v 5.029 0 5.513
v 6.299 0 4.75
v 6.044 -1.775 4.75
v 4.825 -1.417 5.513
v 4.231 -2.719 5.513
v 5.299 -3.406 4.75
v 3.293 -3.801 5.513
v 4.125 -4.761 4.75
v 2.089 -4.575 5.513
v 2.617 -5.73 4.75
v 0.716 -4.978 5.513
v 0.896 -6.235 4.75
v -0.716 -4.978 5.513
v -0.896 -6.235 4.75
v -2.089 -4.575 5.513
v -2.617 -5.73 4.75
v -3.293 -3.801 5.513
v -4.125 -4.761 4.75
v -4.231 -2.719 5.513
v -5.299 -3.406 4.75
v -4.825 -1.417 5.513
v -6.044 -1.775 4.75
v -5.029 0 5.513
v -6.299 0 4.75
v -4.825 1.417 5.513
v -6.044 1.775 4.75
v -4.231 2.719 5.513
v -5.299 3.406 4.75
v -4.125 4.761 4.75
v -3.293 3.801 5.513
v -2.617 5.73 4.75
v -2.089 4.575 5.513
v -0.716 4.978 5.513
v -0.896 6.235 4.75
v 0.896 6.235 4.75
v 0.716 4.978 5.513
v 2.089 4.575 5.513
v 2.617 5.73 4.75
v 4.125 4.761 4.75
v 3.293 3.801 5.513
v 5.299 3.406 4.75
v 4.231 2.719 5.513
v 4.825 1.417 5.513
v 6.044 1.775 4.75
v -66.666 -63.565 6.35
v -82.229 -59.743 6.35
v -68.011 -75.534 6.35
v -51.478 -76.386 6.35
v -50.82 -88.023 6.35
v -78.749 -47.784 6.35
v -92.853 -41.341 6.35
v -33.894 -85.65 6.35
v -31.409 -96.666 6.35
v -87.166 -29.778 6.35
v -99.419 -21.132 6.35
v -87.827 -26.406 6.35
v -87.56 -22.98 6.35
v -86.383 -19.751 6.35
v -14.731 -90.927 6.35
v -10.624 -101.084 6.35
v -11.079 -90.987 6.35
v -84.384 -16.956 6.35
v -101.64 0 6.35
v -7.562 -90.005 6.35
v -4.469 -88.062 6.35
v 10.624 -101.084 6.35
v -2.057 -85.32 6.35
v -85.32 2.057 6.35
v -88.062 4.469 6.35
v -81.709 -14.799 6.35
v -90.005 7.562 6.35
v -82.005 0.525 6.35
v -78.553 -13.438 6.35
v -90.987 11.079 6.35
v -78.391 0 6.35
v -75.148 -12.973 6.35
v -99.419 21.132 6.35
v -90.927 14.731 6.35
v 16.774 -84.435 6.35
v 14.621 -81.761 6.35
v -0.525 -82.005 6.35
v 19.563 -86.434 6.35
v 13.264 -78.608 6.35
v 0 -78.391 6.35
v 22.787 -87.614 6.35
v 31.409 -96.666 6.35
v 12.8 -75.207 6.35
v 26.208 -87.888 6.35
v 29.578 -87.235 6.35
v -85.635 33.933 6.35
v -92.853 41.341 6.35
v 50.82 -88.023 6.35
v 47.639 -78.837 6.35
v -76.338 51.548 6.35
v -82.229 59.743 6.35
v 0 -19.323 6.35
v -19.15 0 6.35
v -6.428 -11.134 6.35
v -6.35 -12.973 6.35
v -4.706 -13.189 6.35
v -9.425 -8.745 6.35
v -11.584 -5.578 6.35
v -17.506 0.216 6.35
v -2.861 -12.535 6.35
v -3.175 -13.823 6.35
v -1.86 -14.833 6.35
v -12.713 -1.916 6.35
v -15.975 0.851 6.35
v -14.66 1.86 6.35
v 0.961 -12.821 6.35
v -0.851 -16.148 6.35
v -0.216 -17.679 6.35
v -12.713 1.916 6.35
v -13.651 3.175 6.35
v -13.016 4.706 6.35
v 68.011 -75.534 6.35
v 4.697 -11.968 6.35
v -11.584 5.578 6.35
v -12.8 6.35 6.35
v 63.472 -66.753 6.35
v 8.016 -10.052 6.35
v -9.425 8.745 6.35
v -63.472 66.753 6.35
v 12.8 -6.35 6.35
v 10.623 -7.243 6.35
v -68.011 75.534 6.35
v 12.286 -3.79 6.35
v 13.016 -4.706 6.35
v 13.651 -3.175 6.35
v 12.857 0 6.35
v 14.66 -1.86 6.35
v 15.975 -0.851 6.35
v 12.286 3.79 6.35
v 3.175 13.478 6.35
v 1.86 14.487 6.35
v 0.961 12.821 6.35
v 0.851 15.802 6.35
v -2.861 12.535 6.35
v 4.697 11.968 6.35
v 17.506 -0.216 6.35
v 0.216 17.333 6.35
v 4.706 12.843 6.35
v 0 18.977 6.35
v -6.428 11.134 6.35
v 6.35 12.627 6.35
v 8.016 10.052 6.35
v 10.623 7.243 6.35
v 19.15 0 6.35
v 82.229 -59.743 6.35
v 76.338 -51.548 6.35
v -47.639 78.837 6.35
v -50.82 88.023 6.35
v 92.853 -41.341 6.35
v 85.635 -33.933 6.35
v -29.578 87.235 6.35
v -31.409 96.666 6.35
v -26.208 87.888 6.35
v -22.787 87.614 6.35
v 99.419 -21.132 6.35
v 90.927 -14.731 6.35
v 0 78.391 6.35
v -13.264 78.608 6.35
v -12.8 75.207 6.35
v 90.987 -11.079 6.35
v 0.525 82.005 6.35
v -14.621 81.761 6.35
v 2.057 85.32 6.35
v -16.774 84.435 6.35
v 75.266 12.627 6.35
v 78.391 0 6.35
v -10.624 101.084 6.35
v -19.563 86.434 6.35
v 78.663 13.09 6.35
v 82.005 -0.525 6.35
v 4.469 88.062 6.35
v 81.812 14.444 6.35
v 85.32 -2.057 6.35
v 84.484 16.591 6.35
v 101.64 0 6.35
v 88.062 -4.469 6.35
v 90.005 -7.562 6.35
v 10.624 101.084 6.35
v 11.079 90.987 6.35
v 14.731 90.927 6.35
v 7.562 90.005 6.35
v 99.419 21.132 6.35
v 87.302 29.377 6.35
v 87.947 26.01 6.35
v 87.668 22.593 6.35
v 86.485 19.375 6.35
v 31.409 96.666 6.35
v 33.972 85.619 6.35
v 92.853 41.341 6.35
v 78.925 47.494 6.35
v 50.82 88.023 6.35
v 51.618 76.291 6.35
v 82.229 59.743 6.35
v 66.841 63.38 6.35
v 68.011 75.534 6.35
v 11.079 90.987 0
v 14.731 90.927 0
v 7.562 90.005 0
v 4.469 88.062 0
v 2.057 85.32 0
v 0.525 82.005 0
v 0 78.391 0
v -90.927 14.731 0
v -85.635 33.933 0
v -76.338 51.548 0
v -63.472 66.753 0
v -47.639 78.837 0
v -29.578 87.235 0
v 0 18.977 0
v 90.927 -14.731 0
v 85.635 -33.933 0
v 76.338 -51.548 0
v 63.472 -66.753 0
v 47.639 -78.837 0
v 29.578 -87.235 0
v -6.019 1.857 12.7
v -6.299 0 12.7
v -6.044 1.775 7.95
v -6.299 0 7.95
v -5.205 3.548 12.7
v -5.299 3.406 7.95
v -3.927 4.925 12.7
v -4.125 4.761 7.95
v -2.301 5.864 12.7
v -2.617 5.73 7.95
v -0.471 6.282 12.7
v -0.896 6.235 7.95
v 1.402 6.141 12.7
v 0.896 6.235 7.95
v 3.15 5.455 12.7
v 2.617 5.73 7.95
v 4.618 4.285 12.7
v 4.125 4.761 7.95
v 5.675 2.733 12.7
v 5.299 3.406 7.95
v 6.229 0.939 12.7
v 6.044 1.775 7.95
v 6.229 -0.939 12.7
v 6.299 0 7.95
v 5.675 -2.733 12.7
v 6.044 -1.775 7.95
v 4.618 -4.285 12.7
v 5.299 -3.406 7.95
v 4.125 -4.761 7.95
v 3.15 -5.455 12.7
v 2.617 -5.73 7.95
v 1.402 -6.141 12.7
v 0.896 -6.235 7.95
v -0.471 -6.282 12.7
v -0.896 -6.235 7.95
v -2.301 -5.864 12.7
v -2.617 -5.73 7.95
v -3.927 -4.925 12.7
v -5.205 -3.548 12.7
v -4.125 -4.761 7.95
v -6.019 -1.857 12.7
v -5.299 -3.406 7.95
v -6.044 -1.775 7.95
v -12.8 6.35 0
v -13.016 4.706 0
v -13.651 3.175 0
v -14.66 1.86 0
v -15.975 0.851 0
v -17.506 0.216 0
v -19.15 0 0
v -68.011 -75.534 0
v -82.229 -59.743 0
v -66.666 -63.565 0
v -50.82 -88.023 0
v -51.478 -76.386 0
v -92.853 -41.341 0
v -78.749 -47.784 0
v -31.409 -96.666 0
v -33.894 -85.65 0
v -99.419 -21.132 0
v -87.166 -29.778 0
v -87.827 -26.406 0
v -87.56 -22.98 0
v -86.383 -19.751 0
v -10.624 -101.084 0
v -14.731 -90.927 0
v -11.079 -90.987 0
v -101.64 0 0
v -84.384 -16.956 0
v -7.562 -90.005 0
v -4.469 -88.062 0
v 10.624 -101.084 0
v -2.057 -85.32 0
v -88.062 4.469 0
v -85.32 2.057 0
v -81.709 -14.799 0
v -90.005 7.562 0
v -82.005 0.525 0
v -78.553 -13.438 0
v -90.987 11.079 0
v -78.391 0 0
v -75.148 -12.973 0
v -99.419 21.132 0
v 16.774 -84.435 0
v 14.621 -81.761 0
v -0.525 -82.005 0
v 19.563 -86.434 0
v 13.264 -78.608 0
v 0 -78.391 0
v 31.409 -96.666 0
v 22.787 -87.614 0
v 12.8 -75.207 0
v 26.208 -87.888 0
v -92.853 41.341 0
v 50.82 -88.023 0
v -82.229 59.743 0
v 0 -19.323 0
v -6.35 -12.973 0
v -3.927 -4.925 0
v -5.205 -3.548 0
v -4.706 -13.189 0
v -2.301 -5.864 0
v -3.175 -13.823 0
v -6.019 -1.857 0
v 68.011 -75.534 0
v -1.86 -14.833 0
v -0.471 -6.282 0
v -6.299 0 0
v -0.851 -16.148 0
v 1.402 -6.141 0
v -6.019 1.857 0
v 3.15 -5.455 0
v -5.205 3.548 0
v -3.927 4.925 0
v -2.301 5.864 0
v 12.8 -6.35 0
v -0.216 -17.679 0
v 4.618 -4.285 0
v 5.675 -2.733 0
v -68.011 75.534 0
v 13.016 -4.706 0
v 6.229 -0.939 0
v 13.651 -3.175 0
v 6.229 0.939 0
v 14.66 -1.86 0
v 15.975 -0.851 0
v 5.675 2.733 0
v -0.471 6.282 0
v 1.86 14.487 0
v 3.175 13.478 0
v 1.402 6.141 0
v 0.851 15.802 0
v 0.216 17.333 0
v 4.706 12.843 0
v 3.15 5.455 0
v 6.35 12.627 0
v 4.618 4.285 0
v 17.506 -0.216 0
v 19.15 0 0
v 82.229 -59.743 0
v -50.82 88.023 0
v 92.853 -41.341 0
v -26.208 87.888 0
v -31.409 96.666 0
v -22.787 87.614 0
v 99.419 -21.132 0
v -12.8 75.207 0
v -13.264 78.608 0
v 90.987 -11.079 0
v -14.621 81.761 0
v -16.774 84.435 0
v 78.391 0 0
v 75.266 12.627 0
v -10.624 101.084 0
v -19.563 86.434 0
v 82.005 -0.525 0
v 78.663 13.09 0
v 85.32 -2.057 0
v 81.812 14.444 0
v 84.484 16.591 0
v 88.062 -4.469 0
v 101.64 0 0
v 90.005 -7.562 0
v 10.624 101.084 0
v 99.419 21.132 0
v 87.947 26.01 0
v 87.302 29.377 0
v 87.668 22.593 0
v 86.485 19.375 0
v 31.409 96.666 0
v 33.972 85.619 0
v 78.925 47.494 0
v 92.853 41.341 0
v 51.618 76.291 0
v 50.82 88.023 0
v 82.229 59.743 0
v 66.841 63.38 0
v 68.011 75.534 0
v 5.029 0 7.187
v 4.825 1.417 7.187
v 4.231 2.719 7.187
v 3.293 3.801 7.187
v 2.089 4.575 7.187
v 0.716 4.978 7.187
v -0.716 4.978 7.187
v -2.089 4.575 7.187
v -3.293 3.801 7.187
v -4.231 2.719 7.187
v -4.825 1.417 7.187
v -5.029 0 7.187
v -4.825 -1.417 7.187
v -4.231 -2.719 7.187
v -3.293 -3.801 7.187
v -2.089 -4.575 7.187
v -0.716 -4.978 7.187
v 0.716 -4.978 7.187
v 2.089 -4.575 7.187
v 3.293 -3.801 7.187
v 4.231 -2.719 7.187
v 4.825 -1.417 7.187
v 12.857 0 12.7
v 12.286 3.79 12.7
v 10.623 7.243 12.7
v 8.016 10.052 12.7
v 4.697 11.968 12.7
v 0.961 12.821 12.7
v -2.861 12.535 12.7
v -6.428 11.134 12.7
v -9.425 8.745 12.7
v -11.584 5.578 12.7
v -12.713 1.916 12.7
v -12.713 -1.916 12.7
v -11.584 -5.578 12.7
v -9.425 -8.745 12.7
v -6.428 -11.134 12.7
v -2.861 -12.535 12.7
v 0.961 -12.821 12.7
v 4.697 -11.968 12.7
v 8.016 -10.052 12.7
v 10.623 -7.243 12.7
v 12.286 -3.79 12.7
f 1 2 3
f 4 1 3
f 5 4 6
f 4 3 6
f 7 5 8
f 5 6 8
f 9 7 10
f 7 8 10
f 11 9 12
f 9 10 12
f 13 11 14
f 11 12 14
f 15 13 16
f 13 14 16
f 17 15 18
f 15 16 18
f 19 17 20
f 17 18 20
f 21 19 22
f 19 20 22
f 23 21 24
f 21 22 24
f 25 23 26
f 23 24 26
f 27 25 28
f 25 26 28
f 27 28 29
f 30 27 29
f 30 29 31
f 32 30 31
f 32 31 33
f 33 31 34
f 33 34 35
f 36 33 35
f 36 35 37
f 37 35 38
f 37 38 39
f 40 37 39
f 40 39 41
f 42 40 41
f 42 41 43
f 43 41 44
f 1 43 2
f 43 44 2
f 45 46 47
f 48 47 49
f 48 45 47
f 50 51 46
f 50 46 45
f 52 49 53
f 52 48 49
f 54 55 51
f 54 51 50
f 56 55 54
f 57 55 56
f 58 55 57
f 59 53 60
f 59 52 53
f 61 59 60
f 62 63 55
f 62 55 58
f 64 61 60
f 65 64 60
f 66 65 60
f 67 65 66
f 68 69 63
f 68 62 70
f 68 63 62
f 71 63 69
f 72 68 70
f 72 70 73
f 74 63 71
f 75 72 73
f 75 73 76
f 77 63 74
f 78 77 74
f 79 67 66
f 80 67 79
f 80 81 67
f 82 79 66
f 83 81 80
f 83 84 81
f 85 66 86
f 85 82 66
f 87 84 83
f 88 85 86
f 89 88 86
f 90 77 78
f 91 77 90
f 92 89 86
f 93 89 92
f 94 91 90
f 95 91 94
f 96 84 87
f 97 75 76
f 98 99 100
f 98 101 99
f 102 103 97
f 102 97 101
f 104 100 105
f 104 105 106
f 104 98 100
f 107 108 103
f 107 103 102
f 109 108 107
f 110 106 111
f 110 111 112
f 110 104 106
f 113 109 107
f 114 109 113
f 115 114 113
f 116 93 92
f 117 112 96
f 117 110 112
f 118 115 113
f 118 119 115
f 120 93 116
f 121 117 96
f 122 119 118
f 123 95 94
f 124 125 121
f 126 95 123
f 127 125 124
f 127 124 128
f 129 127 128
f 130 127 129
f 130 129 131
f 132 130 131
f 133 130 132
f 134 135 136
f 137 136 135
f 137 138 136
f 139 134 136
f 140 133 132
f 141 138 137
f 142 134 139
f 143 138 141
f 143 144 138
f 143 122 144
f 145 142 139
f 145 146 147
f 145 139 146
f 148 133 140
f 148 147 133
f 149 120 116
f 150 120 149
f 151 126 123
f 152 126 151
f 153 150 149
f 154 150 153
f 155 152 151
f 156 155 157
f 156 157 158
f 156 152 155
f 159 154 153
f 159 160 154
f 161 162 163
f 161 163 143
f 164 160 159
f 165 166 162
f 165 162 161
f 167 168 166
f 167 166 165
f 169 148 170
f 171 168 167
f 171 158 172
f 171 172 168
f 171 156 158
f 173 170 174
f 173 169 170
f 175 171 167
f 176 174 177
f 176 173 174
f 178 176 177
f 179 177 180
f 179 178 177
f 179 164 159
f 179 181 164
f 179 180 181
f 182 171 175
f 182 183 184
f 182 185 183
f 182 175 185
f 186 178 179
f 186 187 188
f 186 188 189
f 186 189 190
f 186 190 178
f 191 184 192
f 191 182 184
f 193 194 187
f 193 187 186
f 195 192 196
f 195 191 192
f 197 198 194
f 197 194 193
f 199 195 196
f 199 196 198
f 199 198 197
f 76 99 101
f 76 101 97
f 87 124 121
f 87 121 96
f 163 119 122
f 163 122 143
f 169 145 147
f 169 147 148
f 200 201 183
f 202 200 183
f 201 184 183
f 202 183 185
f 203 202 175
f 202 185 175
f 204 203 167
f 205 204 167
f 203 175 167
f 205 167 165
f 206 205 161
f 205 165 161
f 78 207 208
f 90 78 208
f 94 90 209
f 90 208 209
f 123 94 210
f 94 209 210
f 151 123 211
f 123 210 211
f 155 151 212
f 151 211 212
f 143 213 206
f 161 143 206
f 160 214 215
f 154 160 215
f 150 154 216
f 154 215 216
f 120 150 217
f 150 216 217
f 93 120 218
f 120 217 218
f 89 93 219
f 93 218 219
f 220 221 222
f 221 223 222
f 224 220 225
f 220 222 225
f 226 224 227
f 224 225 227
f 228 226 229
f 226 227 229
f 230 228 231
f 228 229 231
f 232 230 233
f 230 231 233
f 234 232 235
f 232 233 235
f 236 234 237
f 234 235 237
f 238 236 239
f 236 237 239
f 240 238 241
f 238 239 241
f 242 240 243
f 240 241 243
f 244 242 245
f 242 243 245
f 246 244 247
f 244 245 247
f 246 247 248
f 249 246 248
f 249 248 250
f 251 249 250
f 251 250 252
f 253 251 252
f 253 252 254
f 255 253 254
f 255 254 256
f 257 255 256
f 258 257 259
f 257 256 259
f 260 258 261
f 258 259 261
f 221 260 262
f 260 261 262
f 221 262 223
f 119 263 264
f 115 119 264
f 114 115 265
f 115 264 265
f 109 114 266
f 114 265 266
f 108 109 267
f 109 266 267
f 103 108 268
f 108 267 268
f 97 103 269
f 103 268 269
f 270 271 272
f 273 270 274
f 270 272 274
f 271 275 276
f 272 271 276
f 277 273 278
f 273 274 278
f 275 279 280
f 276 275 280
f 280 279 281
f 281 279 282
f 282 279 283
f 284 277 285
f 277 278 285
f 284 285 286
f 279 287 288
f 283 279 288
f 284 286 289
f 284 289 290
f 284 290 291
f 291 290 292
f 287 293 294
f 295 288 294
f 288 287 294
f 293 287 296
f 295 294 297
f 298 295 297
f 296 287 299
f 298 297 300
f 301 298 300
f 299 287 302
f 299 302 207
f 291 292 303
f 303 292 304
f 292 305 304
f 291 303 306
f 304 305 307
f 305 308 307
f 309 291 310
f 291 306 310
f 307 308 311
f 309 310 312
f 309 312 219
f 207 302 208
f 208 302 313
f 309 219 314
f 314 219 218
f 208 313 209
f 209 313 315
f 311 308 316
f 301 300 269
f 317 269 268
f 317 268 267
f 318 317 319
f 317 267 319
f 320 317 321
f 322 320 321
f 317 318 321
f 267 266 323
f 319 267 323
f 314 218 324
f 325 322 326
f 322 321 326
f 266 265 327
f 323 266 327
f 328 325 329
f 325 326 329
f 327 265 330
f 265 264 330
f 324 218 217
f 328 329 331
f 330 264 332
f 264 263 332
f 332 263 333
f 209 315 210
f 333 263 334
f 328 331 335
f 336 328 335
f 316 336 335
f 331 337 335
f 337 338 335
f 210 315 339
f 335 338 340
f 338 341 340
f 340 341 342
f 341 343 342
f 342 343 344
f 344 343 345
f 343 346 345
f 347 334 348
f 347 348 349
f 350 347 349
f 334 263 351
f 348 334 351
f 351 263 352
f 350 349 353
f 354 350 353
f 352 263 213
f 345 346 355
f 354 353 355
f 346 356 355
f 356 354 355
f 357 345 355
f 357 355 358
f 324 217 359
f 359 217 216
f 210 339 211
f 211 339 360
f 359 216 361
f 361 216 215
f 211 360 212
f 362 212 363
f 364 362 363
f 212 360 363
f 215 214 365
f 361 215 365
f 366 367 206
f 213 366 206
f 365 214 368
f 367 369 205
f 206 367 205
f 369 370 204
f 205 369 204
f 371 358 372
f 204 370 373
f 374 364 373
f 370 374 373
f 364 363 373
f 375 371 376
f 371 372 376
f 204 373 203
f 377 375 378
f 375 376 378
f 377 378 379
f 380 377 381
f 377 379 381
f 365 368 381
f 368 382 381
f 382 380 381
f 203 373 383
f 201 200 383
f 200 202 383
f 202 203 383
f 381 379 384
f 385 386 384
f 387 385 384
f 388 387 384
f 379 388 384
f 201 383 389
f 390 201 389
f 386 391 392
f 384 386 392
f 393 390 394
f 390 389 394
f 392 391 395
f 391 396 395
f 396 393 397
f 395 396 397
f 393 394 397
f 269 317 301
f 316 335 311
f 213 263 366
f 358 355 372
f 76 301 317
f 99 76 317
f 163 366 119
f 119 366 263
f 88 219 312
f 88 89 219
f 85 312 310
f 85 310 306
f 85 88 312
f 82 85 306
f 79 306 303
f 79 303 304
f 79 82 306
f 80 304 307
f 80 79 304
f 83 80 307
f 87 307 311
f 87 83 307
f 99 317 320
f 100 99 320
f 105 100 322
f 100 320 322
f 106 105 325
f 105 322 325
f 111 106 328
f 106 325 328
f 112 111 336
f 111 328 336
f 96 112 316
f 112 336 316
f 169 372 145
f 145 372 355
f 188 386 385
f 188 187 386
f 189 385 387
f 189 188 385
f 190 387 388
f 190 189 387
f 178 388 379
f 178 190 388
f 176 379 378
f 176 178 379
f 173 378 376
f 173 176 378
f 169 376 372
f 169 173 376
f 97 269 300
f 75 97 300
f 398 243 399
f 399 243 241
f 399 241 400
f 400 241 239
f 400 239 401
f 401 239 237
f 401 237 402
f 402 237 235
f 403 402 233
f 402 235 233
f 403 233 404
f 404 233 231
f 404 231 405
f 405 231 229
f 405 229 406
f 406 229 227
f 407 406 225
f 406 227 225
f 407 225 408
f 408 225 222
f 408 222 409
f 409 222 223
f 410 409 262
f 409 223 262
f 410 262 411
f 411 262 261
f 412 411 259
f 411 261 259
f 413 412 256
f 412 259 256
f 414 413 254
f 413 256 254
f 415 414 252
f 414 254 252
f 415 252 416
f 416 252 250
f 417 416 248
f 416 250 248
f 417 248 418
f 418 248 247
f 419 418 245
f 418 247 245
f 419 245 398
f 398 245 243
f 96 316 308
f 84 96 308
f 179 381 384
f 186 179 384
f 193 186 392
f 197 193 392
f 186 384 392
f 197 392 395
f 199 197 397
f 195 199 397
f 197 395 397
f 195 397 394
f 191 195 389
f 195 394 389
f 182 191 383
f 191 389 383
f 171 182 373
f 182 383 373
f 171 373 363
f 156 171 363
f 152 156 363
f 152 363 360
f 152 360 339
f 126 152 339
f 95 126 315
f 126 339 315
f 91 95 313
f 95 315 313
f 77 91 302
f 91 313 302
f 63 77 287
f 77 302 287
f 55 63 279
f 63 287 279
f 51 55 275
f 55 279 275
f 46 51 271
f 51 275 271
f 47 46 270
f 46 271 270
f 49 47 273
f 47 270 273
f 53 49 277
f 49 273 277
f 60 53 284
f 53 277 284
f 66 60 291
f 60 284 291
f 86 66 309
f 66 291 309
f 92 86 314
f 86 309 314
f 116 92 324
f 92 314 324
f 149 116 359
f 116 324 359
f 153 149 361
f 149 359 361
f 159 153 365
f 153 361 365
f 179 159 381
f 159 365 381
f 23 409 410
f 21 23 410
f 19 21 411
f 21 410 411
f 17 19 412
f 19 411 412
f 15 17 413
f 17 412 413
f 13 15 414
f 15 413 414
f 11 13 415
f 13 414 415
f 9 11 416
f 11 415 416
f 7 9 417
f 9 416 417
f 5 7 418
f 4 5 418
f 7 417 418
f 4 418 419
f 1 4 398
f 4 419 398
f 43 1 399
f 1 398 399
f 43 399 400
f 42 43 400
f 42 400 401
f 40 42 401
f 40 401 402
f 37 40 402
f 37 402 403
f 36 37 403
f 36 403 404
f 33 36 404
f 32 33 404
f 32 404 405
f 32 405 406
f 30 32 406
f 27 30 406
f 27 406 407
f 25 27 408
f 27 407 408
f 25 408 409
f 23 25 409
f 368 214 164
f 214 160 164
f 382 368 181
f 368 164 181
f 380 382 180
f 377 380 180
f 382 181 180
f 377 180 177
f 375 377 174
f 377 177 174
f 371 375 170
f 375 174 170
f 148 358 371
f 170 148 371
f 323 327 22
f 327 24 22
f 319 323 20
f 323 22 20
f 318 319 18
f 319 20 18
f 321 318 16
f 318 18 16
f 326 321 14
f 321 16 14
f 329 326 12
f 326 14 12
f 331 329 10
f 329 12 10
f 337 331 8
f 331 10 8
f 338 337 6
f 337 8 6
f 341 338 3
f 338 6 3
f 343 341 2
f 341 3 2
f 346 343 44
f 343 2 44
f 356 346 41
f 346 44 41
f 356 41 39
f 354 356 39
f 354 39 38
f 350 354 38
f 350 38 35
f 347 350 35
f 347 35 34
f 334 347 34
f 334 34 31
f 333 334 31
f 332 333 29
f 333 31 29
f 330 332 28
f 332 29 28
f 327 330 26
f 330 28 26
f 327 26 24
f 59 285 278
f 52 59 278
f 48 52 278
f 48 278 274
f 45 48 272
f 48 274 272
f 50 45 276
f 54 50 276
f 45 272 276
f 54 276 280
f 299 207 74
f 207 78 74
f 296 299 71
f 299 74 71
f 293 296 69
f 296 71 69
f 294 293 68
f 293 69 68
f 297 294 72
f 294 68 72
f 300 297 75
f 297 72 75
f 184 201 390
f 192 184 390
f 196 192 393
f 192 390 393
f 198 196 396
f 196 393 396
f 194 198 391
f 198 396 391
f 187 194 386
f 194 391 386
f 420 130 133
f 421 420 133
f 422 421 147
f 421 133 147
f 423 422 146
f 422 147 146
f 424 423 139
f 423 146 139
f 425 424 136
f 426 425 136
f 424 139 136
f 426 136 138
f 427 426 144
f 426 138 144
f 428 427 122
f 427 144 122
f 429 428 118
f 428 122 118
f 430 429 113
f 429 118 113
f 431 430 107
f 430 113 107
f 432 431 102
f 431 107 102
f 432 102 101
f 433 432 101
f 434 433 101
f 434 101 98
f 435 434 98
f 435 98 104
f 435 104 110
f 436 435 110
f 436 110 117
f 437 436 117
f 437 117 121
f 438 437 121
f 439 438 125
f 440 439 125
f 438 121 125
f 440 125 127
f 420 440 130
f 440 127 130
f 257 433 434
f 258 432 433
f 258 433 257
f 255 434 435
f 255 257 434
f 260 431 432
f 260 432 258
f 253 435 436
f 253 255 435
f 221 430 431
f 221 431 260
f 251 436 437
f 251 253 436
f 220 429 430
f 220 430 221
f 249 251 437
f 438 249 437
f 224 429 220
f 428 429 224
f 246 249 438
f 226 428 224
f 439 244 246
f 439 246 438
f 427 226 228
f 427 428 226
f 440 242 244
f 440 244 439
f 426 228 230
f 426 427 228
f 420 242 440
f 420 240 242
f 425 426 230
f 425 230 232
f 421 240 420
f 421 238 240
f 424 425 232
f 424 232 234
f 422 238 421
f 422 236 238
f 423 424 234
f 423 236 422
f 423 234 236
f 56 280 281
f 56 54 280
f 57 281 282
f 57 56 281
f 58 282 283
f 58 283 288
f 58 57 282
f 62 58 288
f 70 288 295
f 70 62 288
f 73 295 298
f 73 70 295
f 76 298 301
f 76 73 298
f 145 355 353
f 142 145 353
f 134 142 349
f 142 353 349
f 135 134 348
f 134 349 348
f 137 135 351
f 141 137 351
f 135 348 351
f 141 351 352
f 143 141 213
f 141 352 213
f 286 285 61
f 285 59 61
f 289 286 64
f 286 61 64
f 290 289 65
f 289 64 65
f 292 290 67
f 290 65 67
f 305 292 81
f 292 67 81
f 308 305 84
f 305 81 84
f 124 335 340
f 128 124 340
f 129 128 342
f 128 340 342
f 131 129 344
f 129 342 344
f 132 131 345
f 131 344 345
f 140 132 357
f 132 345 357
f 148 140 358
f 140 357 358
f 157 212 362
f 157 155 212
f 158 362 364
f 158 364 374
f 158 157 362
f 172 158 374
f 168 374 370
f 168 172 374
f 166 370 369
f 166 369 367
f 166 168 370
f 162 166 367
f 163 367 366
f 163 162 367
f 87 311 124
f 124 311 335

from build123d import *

# Parameters (mm, degrees)
F0_R      = 101.6404719392
F1_DEPTH  = 6.35
F2_R      = 12.7
F3_R      = 12.7
F4_R      = 12.7
F5_R      = 12.7
F6_R      = 12.8569190272
F7_DEPTH  = 6.35
F9_D      = 12.5984
F9_DEPTH  = 4.7498
F9_TIP    = 3.7849412114
F11_D     = 12.5984
F11_DEPTH = 4.7498
F11_TIP   = 3.7849412114
F12_D     = 10.0584


with BuildPart() as f1:
    # F0 (on Top) → F1 (new body)
    with BuildSketch(Plane.XY):
        Circle(F0_R)
        with BuildLine():
            ThreePointArc((91.2431268086, 12.6268099993), (91.8950293011, 6.328357632), (92.112672964, 0))
            ThreePointArc((92.112672964, 0), (69.5117488598, -60.438905442), (12.7997798845, -91.2190229912))
            ThreePointArc((12.7997798845, -91.2190229912), (6.4154691053, -91.8889888764), (0, -92.112672964))
            ThreePointArc((0, -92.112672964), (-60.3729648841, -69.5690278189), (-91.194584597, -12.972750701))
            ThreePointArc((-91.194584597, -12.972750701), (-91.8828642012, -6.5025984614), (-92.112672964, 0))
            ThreePointArc((-92.112672964, 0), (-69.5117488598, 60.438905442), (-12.7997798845, 91.2190229912))
            ThreePointArc((-12.7997798845, 91.2190229912), (-6.4154691053, 91.8889888764), (0, 92.112672964))
            ThreePointArc((0, 92.112672964), (60.5047737808, 69.4544229715), (91.2431268086, 12.6268099993))
        make_face(mode=Mode.SUBTRACT)
        with BuildLine():
            Line((19.1497798845, 0), (92.112672964, 0))
            ThreePointArc((92.112672964, 0), (91.8950293011, 6.328357632), (91.2431268086, 12.6268099993))
            Line((91.2431268086, 12.6268099993), (6.35, 12.6268099993))
            ThreePointArc((6.35, 12.6268099993), (1.8598719395, 14.4866819388), (0, 18.9768099993))
            Line((0, 18.9768099993), (0, 92.112672964))
            ThreePointArc((0, 92.112672964), (-6.4154691053, 91.8889888764), (-12.7997798845, 91.2190229912))
            Line((-12.7997798845, 91.2190229912), (-12.7997798845, 6.35))
            ThreePointArc((-12.7997798845, 6.35), (-14.659651824, 1.8598719395), (-19.1497798845, 0))
            Line((-19.1497798845, 0), (-92.112672964, 0))
            ThreePointArc((-92.112672964, 0), (-91.8828642012, -6.5025984614), (-91.194584597, -12.972750701))
            Line((-91.194584597, -12.972750701), (-6.35, -12.972750701))
            ThreePointArc((-6.35, -12.972750701), (-1.8598719395, -14.8326226405), (0, -19.322750701))
            Line((0, -19.322750701), (0, -92.112672964))
            ThreePointArc((0, -92.112672964), (6.4154691053, -91.8889888764), (12.7997798845, -91.2190229912))
            Line((12.7997798845, -91.2190229912), (12.7997798845, -6.35))
            ThreePointArc((12.7997798845, -6.35), (14.659651824, -1.8598719395), (19.1497798845, 0))
        make_face()
    extrude(amount=F1_DEPTH)

    # F2
    f2_edges = [f1.edges().sort_by_distance(p)[0] for p in [
        (-91.194585, -12.972751, 3.175),
        (0, 92.112673, 3.175),
    ]]
    fillet(f2_edges, radius=F2_R)

    # F3
    f3_edges = [f1.edges().sort_by_distance(p)[0] for p in [
        (12.79978, -91.219023, 3.175),
        (-92.112673, 0, 3.175),
    ]]
    fillet(f3_edges, radius=F3_R)

    # F4
    f4_edges = [f1.edges().sort_by_distance(p)[0] for p in [
        (-12.79978, 91.219023, 3.175),
        (92.112673, 0, 3.175),
    ]]
    fillet(f4_edges, radius=F4_R)

    # F5
    f5_edges = [f1.edges().sort_by_distance(p)[0] for p in [
        (91.243127, 12.62681, 3.175),
        (0, -92.112673, 3.175),
    ]]
    fillet(f5_edges, radius=F5_R)

    # F6 (on face) → F7 (join)
    with BuildSketch(Plane.XY.offset(6.35)):
        Circle(F6_R)
    extrude(amount=F7_DEPTH)

    # F9
    with Locations(Plane.XY.offset(12.7)):
        with Locations((0, 0)):
            Hole(F9_D / 2, depth=F9_DEPTH)
            with Locations((0, 0, -(F9_DEPTH + F9_TIP / 2))):  # 118° drill point
                Cone(0, F9_D / 2, F9_TIP, mode=Mode.SUBTRACT)

    # F11
    with Locations(Plane(origin=(0, 0, 0), x_dir=(1, 0, 0), z_dir=(0, 0, -1))):
        with Locations((0, 0)):
            Hole(F11_D / 2, depth=F11_DEPTH)
            with Locations((0, 0, -(F11_DEPTH + F11_TIP / 2))):  # 118° drill point
                Cone(0, F11_D / 2, F11_TIP, mode=Mode.SUBTRACT)

    # F12 (through all)
    with Locations(Plane(origin=(0, 0, 0), x_dir=(1, 0, 0), z_dir=(0, 0, -1))):
        with Locations((0, 0)):
            Hole(F12_D / 2)


solid = f1.part
